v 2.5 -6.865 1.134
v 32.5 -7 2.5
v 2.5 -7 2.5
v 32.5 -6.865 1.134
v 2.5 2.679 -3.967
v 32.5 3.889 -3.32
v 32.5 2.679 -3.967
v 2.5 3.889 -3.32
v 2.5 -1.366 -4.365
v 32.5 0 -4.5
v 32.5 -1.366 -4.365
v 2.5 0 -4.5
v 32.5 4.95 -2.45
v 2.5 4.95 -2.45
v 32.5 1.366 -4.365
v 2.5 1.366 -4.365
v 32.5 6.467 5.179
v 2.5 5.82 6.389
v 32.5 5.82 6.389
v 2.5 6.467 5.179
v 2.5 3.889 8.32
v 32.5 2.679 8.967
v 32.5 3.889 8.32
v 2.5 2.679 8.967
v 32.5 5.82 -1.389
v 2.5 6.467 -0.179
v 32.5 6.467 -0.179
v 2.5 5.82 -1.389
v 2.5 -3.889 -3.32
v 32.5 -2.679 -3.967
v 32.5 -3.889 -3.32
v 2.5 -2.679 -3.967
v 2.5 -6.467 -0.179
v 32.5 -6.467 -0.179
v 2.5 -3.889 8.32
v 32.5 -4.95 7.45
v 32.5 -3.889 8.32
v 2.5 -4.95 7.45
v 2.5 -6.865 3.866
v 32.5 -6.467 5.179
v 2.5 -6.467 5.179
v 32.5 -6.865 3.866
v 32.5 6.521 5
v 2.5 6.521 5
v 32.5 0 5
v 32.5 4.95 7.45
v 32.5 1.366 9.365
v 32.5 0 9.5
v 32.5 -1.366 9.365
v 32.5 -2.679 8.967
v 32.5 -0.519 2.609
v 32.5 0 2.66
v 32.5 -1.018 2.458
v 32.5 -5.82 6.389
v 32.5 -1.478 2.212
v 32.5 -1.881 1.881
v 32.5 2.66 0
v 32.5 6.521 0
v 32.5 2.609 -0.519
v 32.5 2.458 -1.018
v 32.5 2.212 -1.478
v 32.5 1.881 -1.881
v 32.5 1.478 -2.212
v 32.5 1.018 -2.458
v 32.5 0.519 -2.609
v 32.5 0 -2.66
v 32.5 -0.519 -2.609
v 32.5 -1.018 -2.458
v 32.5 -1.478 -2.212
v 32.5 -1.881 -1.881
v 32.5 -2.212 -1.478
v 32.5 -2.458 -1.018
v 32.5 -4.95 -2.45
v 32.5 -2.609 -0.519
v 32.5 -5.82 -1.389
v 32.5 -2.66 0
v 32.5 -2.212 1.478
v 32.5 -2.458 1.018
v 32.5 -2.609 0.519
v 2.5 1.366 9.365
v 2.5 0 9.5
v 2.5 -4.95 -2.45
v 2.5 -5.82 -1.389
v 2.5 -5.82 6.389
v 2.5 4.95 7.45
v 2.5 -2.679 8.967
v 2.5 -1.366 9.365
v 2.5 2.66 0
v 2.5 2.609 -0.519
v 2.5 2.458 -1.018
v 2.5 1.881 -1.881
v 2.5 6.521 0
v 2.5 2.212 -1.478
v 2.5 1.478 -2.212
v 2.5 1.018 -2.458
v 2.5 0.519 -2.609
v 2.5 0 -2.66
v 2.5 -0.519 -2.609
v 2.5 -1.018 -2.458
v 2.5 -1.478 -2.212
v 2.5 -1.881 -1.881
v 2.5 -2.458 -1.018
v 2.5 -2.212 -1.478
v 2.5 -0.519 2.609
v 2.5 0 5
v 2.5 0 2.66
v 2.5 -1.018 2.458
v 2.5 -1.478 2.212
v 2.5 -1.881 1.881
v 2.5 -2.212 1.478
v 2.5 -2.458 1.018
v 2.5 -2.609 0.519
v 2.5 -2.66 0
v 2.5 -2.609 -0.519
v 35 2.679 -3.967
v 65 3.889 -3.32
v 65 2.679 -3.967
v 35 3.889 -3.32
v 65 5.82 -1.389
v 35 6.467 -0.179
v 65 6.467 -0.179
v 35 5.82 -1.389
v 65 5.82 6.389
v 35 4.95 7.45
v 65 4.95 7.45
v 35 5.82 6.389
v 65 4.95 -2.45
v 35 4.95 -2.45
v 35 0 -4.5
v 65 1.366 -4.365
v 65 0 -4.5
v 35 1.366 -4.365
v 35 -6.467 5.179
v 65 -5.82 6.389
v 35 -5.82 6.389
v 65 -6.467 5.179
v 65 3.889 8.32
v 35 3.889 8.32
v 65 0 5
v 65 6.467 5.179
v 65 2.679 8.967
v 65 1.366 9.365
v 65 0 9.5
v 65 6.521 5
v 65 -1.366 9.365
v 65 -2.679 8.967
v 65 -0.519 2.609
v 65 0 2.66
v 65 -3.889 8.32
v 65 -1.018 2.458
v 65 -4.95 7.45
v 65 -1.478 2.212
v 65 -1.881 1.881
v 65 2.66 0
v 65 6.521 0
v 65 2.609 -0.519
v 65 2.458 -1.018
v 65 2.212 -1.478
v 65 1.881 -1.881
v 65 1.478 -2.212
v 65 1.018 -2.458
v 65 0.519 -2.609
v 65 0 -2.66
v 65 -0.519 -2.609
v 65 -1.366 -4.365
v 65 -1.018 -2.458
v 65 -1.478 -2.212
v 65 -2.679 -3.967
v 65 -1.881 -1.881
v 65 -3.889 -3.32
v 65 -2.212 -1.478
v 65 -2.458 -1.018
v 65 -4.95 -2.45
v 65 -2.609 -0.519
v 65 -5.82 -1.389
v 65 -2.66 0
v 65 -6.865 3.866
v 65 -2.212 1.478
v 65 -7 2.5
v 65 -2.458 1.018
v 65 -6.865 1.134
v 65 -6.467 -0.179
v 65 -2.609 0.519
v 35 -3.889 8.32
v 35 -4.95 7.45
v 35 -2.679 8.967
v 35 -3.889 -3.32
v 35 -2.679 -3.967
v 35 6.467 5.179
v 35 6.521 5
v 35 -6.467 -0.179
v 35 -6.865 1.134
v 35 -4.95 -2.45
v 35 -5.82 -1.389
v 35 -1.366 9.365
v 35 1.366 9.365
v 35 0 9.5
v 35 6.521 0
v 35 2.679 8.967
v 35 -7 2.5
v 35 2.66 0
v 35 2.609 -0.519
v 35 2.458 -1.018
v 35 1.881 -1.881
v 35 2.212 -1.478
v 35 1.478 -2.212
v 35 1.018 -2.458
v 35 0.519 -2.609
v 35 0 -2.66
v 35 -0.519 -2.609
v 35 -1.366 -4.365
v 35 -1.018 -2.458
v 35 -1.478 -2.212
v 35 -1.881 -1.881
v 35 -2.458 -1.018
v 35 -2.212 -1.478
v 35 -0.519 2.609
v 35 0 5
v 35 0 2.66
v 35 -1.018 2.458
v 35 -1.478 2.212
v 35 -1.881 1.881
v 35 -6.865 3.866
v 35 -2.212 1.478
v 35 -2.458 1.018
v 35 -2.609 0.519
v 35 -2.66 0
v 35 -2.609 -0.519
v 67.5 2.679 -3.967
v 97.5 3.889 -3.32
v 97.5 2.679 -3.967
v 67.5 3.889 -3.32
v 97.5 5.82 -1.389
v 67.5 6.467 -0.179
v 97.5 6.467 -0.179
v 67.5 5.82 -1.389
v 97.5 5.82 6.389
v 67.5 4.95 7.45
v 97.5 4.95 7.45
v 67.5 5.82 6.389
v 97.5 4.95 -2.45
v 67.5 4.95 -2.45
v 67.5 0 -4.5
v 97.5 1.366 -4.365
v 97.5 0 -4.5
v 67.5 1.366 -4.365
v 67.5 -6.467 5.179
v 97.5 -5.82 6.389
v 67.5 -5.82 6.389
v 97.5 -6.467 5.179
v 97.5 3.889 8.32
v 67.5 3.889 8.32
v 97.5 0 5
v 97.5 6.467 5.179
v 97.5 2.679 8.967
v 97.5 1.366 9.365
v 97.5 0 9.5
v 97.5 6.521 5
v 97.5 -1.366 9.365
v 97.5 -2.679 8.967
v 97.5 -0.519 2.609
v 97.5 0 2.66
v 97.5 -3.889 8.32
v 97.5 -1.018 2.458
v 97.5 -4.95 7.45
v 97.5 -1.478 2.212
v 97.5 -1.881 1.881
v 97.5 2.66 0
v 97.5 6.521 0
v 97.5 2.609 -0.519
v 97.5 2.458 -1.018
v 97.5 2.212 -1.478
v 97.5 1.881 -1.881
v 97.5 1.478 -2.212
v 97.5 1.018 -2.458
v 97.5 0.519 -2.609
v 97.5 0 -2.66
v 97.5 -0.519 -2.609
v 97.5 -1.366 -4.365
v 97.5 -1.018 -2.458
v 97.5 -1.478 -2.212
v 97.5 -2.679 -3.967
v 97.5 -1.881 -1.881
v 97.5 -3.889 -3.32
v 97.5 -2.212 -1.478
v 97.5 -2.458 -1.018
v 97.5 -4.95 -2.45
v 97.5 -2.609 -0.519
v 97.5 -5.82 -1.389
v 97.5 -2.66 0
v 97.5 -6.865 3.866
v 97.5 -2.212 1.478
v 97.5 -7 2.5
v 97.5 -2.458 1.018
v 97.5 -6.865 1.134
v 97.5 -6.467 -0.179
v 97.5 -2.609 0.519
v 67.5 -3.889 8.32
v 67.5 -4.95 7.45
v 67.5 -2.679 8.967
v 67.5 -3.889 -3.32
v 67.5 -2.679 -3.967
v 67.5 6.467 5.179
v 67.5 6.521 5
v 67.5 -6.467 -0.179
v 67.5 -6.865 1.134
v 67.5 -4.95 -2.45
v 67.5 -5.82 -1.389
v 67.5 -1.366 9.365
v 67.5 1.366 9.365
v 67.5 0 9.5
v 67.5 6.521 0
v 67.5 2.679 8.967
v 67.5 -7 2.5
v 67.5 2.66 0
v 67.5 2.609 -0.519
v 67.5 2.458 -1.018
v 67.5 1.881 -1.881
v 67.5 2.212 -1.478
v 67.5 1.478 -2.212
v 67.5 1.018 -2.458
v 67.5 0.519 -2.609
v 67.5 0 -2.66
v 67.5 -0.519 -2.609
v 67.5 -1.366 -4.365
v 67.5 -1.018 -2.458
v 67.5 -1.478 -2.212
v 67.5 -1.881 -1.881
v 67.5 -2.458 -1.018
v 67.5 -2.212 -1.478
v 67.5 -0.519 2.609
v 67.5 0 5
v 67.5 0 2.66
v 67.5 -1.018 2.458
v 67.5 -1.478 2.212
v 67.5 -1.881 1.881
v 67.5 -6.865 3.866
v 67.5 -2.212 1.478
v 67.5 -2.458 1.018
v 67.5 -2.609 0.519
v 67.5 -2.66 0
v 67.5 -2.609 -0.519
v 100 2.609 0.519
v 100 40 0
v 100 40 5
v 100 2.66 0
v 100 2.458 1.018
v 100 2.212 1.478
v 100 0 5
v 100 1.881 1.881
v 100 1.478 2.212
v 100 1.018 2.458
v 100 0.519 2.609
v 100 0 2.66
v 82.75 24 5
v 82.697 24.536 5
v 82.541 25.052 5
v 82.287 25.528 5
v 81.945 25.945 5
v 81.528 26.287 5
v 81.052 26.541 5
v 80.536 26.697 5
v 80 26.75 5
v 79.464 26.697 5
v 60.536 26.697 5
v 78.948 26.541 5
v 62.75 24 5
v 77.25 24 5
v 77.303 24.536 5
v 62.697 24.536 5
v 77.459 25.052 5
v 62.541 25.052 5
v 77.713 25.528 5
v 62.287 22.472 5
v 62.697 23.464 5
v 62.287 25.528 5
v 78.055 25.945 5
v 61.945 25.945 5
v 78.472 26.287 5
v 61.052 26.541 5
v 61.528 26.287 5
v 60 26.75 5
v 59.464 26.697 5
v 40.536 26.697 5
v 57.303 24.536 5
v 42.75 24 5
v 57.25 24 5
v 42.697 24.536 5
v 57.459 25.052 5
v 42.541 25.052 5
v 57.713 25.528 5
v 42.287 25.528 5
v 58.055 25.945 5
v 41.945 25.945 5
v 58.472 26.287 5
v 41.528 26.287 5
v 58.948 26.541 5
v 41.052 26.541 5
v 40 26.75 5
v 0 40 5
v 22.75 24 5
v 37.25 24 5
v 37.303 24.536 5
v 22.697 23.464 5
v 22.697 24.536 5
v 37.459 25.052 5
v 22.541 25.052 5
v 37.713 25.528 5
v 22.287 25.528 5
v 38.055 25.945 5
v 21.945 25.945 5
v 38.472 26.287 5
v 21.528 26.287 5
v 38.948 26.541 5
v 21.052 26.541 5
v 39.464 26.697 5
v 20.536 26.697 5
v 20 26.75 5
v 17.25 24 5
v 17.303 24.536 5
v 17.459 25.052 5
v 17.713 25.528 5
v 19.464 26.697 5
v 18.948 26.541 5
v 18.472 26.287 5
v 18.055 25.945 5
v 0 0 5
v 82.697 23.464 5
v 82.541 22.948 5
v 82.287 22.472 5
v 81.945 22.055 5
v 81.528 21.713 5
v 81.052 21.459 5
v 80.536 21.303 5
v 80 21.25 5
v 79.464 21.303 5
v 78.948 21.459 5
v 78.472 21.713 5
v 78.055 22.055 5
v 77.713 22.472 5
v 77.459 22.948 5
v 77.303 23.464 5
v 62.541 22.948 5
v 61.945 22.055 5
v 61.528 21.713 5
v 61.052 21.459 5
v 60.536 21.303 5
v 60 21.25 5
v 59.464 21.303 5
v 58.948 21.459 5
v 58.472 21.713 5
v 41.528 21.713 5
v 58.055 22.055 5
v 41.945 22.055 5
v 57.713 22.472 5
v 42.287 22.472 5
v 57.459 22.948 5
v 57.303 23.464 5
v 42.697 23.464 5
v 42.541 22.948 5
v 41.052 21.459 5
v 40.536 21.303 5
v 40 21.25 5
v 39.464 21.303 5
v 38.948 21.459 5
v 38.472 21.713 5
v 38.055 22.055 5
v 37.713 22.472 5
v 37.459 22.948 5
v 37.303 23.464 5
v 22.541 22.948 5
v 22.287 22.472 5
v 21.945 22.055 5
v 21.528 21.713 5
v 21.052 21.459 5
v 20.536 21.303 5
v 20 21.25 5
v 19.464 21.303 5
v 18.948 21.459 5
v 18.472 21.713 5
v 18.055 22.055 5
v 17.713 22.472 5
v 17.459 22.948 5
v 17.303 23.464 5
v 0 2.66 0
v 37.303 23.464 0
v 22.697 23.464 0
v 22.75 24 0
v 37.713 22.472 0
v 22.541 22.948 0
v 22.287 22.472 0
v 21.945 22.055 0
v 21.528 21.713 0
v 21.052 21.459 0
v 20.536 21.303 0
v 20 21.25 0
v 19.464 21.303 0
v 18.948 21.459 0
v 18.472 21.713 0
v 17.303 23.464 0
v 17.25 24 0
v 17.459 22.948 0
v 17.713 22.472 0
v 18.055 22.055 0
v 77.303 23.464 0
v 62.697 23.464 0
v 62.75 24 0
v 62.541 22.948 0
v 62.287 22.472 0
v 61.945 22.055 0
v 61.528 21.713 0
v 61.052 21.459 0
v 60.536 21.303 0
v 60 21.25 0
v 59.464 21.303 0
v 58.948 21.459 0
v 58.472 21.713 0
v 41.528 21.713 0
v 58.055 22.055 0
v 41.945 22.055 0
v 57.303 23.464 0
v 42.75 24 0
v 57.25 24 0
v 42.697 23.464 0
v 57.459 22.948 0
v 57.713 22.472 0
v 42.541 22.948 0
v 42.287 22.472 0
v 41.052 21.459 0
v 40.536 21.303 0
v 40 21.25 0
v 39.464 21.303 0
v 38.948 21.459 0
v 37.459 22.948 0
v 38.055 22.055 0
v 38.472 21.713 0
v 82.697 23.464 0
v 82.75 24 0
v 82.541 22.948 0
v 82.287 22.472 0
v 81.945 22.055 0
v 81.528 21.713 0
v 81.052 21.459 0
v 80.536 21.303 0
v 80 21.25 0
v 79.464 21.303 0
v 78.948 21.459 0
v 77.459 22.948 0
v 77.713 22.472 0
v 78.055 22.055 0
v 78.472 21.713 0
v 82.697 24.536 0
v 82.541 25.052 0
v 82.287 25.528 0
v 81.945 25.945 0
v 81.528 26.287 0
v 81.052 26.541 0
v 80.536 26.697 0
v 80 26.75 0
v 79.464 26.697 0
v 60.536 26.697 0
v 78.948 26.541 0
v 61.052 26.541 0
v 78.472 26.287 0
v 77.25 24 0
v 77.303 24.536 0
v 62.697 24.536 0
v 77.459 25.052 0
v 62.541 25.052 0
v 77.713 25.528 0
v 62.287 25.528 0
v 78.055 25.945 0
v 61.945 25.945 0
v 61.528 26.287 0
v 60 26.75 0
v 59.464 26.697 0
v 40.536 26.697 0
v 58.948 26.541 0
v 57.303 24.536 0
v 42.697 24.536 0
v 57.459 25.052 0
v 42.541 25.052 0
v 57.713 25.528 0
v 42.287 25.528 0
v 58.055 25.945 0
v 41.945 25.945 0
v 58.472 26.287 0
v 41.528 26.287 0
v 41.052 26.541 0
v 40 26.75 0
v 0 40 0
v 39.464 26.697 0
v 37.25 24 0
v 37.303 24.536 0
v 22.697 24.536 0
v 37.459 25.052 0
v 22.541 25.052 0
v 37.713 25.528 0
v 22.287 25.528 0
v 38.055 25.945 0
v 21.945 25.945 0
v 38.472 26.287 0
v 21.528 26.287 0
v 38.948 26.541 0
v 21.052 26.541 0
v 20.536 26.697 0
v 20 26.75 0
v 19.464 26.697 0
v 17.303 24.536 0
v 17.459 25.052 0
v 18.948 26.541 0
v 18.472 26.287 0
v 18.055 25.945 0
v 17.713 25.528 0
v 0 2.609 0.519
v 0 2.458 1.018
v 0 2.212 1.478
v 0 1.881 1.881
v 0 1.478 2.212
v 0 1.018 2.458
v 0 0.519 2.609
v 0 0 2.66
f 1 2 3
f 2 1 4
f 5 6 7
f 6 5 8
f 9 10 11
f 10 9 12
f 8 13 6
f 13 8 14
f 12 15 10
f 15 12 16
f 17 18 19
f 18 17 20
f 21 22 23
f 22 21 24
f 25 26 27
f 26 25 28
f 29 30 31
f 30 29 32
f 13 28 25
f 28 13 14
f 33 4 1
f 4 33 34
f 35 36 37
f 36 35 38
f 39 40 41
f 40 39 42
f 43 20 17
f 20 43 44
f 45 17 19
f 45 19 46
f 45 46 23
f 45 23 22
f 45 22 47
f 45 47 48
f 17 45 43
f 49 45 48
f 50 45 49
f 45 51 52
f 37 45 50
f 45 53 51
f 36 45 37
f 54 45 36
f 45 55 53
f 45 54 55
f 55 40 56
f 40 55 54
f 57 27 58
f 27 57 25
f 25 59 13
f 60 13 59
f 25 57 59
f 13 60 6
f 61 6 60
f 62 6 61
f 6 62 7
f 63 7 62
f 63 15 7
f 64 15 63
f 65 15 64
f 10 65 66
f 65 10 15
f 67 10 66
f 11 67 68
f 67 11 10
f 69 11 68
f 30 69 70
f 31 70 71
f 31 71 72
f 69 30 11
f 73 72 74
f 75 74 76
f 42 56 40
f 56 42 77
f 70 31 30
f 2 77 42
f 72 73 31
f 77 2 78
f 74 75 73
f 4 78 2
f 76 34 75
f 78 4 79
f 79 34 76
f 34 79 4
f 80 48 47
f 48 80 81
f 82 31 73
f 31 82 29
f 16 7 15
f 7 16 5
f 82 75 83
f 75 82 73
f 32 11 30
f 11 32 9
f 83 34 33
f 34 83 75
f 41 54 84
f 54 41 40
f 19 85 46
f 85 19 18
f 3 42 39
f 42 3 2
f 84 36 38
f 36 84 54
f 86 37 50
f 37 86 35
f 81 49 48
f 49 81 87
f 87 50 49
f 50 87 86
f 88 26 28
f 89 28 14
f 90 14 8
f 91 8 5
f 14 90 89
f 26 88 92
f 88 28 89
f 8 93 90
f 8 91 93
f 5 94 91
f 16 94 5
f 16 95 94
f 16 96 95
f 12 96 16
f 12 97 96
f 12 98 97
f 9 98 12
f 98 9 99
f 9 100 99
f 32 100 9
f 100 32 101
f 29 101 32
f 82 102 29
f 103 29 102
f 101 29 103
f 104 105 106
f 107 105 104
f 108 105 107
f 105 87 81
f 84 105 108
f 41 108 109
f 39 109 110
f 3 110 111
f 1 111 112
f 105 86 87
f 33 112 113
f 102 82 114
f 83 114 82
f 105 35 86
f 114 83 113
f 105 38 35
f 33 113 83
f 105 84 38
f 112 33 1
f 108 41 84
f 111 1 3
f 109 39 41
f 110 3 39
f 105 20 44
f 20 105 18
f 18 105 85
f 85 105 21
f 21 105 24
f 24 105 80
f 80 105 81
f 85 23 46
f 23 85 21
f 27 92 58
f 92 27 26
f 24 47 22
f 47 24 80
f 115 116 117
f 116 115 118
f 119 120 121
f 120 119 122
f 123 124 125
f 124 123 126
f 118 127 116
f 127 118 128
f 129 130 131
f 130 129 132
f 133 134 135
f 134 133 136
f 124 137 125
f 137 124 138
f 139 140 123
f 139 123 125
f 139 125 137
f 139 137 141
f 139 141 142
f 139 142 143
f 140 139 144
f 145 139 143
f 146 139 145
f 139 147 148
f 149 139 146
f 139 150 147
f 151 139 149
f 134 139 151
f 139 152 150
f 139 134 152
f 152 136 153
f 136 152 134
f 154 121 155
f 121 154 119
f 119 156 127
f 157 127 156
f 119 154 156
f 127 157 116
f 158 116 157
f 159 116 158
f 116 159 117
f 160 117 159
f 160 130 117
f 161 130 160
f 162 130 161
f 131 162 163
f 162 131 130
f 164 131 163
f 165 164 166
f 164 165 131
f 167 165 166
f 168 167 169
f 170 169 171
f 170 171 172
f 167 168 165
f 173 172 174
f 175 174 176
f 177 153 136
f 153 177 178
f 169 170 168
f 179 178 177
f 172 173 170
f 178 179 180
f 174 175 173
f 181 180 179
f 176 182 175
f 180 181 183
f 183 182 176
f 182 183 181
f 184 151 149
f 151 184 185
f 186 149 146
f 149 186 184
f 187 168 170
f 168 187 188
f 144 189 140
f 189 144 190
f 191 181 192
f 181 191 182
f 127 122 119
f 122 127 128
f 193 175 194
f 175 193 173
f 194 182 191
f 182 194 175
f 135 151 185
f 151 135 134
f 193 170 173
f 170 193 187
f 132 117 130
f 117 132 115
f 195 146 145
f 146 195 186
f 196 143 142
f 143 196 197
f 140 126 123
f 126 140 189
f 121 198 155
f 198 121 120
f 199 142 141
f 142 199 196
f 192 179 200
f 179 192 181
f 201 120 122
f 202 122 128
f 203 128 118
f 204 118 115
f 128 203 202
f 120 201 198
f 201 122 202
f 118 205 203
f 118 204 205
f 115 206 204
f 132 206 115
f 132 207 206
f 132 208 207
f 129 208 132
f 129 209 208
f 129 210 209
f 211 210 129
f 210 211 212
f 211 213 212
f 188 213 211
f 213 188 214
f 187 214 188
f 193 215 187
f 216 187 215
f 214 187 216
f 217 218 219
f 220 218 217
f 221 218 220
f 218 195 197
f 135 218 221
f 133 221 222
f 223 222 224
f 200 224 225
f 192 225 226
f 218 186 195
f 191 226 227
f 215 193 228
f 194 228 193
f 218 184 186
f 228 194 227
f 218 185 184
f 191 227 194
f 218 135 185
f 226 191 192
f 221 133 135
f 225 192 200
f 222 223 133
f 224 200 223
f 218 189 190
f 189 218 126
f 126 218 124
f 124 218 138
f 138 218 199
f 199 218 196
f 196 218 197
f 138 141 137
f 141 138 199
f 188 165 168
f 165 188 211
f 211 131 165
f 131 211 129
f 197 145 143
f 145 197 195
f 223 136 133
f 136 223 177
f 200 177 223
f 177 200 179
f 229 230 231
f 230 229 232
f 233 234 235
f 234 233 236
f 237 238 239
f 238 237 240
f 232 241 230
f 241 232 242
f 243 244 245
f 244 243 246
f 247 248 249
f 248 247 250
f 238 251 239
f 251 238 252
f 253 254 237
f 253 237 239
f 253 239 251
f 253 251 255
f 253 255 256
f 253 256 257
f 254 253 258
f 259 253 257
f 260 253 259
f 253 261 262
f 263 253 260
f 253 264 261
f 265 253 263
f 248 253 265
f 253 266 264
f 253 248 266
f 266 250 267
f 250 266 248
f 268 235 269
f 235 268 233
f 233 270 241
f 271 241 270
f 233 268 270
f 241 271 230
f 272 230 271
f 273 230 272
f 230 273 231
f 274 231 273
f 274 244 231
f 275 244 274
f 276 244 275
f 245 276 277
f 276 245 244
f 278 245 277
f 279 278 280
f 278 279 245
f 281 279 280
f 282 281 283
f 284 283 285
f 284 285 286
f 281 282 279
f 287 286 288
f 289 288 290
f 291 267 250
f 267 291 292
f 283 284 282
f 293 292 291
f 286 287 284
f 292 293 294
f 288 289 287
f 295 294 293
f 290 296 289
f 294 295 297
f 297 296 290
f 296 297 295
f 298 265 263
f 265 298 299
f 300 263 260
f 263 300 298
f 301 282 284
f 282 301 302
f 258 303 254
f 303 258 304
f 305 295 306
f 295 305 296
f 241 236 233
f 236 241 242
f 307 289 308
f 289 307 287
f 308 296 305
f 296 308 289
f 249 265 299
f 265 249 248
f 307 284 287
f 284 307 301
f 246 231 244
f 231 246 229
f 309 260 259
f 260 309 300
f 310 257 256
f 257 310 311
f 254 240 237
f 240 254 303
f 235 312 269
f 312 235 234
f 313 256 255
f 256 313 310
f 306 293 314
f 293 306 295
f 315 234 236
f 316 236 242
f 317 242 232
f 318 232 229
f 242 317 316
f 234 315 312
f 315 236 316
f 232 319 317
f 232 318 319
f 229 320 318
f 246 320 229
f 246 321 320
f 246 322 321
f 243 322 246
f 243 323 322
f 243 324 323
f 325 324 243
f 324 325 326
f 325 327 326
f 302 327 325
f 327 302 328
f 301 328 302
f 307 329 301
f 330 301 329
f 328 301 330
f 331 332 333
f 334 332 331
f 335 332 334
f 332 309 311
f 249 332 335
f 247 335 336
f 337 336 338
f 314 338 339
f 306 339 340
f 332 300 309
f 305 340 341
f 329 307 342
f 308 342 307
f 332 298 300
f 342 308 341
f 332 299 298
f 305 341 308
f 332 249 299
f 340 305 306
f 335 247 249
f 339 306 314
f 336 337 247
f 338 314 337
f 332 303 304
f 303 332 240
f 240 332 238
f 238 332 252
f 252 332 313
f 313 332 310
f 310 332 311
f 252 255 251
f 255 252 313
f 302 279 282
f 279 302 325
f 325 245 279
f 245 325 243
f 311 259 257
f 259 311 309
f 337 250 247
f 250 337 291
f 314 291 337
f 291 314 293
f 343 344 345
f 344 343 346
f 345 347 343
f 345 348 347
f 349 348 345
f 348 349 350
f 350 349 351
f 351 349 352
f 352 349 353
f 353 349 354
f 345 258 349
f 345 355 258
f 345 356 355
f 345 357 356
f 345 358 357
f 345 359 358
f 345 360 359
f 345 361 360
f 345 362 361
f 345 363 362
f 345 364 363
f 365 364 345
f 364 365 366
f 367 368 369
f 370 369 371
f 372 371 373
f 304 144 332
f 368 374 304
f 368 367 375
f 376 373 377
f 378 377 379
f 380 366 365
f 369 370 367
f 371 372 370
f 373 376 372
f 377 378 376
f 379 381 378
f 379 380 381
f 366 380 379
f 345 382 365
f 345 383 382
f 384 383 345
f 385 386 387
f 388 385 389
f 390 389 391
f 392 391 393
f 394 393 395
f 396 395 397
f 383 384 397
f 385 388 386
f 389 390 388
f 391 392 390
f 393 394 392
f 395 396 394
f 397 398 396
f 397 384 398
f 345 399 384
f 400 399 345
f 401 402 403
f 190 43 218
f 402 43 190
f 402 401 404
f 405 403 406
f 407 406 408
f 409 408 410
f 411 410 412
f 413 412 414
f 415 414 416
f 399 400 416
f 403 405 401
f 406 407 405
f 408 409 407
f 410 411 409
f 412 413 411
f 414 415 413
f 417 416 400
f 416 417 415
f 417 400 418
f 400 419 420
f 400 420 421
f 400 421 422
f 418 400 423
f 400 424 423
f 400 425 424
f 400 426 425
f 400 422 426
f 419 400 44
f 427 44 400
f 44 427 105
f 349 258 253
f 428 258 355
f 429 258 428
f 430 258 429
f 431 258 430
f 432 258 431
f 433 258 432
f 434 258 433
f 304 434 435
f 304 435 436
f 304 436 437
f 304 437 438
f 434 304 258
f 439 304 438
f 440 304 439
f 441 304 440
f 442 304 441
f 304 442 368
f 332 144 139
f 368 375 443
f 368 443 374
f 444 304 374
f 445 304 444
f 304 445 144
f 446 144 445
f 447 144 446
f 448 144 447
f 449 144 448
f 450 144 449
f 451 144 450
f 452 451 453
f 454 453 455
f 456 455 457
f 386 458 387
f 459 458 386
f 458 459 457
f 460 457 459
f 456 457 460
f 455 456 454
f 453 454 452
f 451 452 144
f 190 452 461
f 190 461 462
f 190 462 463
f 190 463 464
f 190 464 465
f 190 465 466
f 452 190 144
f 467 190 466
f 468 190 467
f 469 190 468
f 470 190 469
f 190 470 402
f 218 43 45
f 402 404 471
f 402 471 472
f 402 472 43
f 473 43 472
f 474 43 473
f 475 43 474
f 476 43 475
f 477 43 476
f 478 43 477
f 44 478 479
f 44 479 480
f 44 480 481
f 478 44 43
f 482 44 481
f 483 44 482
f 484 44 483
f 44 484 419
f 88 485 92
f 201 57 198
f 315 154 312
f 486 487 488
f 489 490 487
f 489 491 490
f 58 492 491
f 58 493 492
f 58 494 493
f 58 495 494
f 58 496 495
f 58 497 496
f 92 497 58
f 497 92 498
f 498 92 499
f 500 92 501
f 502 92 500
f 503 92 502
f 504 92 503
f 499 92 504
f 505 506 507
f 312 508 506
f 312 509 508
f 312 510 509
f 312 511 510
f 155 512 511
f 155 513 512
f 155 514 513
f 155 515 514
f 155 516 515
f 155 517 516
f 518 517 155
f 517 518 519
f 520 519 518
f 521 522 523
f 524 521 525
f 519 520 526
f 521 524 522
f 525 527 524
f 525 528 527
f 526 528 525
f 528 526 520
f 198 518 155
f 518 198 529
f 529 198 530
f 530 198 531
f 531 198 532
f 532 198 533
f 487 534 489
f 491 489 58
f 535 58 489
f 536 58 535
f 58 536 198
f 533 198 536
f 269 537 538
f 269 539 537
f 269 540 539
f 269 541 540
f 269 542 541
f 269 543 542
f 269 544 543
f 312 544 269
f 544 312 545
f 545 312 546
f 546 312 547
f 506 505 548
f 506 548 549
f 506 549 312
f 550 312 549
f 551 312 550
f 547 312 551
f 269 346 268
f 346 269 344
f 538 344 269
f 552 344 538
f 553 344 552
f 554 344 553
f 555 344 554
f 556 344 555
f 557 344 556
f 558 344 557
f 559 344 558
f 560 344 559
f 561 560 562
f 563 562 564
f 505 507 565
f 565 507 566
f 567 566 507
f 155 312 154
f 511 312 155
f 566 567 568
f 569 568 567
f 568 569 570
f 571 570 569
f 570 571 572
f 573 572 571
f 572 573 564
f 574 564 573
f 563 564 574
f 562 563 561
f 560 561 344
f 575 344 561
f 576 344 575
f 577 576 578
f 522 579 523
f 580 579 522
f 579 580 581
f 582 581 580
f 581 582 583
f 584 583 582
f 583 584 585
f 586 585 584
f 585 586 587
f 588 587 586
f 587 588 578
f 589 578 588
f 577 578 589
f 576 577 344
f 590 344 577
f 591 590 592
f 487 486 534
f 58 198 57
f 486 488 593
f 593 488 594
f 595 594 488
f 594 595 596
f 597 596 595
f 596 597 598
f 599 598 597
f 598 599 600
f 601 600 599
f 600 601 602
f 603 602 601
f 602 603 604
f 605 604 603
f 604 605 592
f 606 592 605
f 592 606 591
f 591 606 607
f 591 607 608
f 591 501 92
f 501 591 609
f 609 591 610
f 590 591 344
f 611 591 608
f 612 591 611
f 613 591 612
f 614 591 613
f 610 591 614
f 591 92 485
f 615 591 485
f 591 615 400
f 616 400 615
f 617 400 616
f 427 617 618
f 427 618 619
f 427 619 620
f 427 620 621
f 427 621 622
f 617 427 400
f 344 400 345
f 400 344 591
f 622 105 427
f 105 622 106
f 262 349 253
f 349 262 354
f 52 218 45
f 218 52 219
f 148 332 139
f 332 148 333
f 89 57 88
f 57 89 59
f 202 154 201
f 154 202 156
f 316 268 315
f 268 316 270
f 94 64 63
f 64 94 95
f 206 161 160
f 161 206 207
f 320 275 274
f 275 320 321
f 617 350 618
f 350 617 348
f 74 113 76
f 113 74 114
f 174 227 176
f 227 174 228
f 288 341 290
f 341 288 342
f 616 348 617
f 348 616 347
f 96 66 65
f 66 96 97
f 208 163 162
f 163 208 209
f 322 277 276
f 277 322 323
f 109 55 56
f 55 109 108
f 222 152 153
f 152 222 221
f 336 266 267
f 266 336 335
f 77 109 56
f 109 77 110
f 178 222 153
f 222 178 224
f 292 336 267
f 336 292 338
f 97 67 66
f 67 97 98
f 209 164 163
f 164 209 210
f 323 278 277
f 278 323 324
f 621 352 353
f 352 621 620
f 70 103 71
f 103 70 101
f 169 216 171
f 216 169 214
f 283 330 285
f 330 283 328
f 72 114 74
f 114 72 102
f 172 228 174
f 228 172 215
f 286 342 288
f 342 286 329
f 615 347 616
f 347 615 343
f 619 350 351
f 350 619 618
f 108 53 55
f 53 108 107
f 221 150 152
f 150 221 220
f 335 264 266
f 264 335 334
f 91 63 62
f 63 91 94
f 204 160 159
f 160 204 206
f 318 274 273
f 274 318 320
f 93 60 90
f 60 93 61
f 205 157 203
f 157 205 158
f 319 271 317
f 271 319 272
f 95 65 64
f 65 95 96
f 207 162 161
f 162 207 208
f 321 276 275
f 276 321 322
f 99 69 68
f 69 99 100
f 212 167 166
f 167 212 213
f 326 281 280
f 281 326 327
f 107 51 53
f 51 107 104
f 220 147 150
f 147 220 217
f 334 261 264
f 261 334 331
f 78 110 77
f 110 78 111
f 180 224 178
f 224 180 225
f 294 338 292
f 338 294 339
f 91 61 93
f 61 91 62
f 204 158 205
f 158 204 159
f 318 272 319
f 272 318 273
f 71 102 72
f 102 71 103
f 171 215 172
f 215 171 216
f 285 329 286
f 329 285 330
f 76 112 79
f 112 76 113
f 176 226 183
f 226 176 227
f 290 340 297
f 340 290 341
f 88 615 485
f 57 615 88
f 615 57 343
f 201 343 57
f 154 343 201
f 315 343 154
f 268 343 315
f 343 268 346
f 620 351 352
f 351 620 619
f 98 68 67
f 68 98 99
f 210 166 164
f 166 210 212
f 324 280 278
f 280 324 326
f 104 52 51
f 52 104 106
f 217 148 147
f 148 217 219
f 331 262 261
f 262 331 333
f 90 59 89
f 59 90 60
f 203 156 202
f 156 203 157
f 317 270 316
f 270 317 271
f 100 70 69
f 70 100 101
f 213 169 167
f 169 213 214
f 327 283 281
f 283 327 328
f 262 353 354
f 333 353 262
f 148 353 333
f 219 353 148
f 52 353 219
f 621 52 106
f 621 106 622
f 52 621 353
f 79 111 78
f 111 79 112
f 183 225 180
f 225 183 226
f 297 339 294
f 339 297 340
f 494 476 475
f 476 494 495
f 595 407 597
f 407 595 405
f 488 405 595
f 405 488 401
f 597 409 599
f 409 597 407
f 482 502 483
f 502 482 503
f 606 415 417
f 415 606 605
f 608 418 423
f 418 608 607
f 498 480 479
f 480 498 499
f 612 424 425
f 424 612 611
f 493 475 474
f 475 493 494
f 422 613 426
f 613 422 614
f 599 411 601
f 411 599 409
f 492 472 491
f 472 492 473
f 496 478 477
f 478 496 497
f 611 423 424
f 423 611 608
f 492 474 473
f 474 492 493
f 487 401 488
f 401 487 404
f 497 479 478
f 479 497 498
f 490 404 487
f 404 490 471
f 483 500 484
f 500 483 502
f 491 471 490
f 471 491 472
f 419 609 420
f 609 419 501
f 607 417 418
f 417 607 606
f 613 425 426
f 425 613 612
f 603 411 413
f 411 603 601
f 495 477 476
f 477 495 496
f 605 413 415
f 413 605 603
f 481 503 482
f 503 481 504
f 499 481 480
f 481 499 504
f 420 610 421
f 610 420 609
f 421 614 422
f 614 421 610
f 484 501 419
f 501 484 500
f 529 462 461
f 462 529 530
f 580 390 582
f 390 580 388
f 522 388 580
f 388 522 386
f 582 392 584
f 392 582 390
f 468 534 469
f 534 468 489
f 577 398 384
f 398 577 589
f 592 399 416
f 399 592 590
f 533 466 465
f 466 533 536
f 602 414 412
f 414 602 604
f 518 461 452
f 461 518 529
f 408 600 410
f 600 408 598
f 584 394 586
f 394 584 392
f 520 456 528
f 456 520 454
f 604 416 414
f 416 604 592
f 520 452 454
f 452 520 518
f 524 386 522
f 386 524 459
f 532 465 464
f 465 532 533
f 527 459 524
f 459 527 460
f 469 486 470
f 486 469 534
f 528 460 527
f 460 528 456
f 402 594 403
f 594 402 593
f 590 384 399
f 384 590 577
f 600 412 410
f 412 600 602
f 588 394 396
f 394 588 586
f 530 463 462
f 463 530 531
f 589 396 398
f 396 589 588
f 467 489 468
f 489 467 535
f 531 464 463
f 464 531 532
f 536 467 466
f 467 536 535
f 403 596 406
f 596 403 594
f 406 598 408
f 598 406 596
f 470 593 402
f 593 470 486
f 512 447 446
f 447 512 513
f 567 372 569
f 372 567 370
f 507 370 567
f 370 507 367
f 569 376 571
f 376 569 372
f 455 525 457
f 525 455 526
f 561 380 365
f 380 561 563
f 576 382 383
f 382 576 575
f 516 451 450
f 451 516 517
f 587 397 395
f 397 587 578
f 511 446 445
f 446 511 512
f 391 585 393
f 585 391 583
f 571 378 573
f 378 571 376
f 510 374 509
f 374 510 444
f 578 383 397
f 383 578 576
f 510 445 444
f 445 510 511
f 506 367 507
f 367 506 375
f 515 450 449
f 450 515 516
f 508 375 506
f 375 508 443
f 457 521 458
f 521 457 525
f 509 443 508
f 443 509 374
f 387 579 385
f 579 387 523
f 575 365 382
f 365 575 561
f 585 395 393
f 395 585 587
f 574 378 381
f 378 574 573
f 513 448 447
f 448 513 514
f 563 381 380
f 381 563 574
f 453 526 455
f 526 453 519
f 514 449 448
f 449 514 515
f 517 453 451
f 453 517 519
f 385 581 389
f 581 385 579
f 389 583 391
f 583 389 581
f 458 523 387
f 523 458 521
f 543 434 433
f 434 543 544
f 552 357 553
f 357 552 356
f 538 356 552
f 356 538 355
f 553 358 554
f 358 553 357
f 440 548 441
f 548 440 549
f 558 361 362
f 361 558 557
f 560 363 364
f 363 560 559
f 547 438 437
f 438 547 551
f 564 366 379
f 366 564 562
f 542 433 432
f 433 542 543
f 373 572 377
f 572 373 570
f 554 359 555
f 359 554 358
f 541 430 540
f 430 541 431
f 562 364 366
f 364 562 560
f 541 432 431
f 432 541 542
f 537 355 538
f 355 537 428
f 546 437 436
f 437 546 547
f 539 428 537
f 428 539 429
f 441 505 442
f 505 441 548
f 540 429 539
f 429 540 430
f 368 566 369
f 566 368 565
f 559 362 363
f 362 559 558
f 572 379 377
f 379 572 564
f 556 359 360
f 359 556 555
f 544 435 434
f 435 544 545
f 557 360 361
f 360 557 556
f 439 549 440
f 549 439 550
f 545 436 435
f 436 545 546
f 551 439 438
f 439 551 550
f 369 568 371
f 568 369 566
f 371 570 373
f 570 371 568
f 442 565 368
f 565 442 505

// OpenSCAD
$fn = 32;

// ----------------------------------------------------------------------
// Hinge leaf: 100 x 47 x 14 mm
// ----------------------------------------------------------------------

// --- parameters (mm) ---
tab_len = 100;            // leaf length, X
tab_w = 40;               // leaf width, Y
tab_t = 5;                // leaf thickness
ring_d = 14;              // knuckle diameter
ring_w = 30;              // knuckle width
knuckle_n = 3;            // number of knuckles
pin_d = 5.32;             // pin bore
gap = 2.5;                // gap between the knuckles
screw_d = 5.5;            // screw clearance

module leaf() {
  cube([tab_len, tab_w, tab_t]);
}

module knuckles() {
  /* barrels sit on the leaf edge, the pin axis at half the leaf thickness */
  for (i = [0 : knuckle_n - 1])
    translate([gap + i * (ring_w + gap), 0, tab_t * 0.5])
      rotate([0, 90, 0]) cylinder(h = ring_w, d = ring_d);
}

difference() {
  union() {
    leaf();
    knuckles();
  }
  rotate([0, 90, 0]) translate([0, 0, -1])
    cylinder(h = tab_len + 2, d = pin_d);
  translate([20, tab_w * 0.6, -1]) cylinder(h = tab_t + 2, d = screw_d);
  translate([40, tab_w * 0.6, -1]) cylinder(h = tab_t + 2, d = screw_d);
  translate([60, tab_w * 0.6, -1]) cylinder(h = tab_t + 2, d = screw_d);
  translate([80, tab_w * 0.6, -1]) cylinder(h = tab_t + 2, d = screw_d);
}
